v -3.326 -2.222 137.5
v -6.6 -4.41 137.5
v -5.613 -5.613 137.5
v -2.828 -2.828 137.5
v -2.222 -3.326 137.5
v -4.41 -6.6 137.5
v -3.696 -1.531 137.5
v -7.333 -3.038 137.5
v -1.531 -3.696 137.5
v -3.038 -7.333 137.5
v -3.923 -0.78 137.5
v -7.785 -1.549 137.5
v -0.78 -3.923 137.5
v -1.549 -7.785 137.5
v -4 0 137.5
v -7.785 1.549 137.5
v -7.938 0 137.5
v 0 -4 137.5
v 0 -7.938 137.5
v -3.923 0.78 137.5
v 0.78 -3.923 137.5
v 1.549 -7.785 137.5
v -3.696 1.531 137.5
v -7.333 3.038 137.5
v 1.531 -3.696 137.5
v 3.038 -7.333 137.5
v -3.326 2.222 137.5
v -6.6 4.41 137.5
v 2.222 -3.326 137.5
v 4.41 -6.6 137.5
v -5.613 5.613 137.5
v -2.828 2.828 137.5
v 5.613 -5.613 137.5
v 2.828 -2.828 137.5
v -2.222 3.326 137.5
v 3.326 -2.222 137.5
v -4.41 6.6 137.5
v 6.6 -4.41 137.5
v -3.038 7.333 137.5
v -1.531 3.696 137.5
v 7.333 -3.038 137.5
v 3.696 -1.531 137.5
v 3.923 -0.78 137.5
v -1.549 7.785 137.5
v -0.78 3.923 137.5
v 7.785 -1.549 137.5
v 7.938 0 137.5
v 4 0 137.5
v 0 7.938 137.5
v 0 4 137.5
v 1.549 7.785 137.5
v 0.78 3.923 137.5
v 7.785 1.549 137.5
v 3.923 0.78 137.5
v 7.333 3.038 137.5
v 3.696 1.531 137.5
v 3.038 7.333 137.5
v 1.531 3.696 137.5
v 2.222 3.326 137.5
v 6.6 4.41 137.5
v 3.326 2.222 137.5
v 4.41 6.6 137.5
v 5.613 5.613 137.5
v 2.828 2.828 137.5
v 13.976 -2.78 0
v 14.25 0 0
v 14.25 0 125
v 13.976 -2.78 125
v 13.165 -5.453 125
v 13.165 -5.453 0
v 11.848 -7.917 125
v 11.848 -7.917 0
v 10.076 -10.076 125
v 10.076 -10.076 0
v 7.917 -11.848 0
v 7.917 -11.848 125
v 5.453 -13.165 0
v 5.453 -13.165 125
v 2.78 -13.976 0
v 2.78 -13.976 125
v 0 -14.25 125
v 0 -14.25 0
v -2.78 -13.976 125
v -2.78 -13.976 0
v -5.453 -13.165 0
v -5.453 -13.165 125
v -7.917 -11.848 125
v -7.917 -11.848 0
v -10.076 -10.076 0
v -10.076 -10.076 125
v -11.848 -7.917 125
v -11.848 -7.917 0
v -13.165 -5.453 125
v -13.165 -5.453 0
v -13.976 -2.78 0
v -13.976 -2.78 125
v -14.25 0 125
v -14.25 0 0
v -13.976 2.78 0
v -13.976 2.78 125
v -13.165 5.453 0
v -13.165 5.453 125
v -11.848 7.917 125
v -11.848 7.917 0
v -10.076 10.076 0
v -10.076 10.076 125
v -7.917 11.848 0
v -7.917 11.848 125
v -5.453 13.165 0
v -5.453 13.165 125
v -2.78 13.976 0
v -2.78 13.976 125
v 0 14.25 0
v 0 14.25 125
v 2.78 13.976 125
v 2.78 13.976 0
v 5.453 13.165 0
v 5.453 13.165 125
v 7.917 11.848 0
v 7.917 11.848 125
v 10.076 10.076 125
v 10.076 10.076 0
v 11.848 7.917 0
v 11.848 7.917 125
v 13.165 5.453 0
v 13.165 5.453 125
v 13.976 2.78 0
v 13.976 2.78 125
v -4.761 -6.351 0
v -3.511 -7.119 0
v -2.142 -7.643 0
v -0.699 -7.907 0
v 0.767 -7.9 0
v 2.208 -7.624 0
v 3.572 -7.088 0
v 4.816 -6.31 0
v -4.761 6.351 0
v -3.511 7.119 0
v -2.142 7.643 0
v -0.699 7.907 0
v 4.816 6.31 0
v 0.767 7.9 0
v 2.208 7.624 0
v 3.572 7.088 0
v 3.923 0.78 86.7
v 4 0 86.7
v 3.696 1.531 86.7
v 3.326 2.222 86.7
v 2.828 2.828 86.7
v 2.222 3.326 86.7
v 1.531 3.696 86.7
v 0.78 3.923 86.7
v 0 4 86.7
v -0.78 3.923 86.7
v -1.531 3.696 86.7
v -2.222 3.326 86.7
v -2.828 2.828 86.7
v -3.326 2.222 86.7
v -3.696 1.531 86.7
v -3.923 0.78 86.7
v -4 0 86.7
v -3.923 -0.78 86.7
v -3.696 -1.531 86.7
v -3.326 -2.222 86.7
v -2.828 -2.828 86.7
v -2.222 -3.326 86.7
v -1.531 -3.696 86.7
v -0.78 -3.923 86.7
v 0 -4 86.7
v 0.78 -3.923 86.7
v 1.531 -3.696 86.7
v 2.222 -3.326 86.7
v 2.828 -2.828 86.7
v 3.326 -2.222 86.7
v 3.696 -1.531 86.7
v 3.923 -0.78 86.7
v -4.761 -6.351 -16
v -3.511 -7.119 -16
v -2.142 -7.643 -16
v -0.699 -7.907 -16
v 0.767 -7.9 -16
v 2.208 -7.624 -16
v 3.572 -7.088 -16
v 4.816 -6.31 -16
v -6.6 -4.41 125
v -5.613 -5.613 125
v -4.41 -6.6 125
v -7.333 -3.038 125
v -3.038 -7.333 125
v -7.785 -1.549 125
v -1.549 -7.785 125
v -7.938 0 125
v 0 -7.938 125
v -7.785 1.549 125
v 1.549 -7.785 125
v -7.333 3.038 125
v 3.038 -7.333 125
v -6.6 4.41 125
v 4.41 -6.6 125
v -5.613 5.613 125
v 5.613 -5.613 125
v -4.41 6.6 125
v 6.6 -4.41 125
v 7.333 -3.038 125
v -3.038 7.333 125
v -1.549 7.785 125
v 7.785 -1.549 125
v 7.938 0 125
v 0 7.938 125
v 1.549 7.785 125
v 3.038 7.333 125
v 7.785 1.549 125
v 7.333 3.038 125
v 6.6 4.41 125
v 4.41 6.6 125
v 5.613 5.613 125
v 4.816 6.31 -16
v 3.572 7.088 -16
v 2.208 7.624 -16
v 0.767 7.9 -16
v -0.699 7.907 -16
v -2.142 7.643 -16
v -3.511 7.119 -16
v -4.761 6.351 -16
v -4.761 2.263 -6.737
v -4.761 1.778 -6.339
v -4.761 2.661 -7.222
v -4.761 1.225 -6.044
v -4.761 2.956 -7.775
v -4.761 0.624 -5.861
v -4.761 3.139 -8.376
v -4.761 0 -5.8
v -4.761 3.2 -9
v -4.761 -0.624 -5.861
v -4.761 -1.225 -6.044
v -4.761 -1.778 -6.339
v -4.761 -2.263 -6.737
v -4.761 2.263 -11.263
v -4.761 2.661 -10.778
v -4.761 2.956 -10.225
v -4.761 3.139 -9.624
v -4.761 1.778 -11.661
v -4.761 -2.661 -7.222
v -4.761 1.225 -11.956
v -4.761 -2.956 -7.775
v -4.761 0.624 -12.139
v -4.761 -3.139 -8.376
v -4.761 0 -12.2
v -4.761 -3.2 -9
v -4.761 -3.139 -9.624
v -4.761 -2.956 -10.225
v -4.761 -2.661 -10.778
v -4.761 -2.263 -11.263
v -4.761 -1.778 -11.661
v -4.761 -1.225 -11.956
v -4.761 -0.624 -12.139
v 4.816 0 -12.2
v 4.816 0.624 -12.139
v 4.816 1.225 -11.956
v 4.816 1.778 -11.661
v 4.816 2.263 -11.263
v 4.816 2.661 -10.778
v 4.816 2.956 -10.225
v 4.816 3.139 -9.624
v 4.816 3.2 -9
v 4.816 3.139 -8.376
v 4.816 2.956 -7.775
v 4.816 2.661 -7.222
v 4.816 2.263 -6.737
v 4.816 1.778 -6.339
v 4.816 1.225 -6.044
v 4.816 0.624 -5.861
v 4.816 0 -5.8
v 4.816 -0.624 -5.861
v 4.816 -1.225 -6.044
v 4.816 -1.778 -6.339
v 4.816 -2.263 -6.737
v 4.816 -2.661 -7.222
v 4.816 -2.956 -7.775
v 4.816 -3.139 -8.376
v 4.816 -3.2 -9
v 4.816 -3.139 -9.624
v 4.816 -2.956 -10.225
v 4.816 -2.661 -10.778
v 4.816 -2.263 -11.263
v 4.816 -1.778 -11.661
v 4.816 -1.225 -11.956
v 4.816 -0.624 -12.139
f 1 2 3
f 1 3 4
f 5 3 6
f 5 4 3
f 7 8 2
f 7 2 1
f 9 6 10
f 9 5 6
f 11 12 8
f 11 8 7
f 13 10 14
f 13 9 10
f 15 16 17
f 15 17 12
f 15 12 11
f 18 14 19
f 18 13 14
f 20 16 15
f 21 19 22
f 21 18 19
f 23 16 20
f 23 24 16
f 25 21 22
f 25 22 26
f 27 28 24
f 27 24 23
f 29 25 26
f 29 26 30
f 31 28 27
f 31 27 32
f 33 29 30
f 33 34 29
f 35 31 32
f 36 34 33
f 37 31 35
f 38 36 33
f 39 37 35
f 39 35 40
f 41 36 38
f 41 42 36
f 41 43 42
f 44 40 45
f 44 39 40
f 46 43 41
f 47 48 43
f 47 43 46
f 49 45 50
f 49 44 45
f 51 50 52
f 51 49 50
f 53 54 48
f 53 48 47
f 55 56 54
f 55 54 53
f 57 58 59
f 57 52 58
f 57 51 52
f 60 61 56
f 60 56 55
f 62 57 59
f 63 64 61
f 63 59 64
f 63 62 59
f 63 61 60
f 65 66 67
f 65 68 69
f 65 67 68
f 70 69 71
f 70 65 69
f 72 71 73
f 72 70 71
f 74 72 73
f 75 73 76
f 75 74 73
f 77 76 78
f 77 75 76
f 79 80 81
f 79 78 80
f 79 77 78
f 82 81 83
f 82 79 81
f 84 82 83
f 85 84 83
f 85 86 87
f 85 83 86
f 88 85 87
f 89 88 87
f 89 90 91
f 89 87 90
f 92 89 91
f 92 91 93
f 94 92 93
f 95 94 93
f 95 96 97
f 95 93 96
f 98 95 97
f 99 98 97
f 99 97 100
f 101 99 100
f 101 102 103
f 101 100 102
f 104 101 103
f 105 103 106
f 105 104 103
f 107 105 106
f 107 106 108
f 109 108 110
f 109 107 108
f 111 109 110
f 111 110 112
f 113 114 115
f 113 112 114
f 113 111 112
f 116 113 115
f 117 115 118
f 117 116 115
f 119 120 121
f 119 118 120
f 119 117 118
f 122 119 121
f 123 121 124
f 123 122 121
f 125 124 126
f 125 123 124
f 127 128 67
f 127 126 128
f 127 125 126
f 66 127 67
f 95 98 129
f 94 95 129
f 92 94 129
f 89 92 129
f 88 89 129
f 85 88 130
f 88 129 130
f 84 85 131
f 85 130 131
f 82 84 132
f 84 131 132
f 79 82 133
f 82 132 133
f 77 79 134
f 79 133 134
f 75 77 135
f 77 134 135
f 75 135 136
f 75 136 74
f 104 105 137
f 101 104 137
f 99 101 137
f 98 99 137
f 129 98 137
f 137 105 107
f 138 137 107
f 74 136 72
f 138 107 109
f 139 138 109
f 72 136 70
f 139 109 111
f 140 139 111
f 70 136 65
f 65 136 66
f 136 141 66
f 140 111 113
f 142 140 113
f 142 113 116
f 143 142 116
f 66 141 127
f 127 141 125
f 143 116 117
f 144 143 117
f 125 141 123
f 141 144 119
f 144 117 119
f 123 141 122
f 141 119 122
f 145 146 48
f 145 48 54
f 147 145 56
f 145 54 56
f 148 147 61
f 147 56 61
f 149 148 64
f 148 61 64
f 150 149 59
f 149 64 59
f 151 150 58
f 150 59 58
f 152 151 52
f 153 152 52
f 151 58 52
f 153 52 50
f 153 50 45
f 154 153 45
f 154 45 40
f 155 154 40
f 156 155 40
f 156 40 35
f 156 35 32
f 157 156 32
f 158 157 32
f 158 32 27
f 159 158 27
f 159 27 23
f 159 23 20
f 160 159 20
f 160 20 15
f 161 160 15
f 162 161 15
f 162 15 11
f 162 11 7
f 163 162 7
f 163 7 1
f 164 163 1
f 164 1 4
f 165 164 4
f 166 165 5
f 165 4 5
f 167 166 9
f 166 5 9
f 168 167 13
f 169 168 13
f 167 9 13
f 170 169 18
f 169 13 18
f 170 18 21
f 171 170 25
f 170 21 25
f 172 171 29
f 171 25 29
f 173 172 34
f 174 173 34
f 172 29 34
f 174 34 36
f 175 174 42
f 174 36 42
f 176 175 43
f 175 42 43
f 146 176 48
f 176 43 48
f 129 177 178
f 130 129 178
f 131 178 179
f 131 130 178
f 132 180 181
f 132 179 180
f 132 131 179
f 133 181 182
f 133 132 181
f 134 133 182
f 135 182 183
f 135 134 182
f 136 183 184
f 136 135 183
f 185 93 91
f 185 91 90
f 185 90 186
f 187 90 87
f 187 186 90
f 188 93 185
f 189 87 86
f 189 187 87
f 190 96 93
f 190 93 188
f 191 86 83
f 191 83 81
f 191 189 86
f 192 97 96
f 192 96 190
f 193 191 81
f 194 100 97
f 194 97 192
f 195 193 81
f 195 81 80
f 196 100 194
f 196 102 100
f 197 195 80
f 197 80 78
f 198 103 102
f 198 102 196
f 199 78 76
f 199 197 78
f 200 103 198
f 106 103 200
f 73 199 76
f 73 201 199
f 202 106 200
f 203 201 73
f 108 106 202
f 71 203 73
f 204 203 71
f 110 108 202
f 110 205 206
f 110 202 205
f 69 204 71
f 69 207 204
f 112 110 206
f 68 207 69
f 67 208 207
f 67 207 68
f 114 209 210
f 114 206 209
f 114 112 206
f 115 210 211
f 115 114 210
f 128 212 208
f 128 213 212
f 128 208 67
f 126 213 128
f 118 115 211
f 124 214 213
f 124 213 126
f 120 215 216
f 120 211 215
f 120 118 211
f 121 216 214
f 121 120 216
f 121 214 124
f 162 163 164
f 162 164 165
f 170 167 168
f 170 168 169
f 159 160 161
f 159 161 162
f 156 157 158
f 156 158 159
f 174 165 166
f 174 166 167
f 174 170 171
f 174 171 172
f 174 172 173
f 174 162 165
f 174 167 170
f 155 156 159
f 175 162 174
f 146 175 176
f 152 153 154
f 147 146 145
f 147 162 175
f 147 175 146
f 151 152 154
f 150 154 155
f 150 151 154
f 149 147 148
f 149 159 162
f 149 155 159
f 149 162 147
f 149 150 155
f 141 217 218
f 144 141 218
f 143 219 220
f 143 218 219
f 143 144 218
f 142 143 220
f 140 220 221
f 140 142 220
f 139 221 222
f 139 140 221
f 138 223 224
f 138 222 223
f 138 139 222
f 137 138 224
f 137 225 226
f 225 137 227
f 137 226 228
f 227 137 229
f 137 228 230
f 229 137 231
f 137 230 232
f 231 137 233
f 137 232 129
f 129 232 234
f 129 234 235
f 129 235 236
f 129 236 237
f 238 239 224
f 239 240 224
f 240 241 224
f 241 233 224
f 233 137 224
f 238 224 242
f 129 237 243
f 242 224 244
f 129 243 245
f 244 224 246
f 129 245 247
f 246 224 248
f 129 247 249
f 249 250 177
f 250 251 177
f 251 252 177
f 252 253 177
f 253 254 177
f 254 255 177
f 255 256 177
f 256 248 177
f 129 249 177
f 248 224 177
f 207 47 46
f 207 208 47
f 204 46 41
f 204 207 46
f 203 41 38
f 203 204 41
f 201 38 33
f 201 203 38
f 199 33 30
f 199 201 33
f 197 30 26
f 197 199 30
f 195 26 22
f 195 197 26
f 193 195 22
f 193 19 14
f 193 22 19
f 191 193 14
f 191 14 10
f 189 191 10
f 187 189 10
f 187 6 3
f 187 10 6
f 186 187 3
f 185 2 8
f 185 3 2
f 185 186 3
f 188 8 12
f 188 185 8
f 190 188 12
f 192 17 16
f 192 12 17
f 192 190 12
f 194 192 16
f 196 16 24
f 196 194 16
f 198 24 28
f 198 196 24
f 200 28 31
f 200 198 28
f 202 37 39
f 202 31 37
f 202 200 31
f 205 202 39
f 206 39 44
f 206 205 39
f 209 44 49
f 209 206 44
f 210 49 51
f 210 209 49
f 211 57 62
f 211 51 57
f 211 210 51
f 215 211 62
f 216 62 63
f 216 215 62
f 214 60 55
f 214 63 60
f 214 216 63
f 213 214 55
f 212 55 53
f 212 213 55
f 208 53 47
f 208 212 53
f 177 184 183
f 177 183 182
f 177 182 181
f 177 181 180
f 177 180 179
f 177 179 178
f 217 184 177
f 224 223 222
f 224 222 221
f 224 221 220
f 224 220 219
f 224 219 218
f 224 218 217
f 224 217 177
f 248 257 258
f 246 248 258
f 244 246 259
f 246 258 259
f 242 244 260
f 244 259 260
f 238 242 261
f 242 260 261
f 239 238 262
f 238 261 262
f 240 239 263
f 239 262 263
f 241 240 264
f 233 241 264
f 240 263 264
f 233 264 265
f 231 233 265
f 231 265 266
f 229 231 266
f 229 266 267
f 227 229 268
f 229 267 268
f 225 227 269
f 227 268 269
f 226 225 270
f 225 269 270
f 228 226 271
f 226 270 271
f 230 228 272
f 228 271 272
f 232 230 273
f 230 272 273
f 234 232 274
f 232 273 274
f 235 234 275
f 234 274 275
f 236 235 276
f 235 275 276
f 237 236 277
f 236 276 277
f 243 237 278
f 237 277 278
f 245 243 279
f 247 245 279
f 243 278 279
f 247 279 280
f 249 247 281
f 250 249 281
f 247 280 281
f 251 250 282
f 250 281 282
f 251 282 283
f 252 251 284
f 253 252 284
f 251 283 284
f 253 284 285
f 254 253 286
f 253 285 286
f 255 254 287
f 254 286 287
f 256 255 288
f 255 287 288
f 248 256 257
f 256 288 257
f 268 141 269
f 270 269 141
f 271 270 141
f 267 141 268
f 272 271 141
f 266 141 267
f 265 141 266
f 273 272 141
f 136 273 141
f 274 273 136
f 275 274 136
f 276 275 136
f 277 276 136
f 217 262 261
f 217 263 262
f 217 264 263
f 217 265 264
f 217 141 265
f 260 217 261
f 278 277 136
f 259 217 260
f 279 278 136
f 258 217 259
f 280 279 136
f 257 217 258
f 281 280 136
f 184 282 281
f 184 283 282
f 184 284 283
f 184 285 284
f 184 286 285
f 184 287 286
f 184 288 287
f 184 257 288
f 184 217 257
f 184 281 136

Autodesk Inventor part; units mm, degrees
ref_plane "YZ Plane" through (0, 0, 0) normal (1, 0, 0) x (0, 1, 0)
ref_plane "XZ Plane" through (0, 0, 0) normal (0, 1, 0) x (-1, 0, 0)
ref_plane "XY Plane" through (0, 0, 0) normal (0, 0, 1) x (1, 0, 0)
sketch "Sketch1" plane through (0, 0, 0) normal (0, 0, 1) x (1, 0, 0)
  circle A0 centre (0, 0) radius 14.25
  dimension "d0" = 28.5
extrude "Extrusion1" add sketch "Sketch1" along normal blind 125
sketch "Sketch2" plane through (0, 0, 125) normal (0, 0, 1) x (1, 0, 0)
  circle A0 centre (0, 0) radius 7.9375
  dimension "d3" = 15.875
extrude "Extrusion2" add sketch "Sketch2" along normal blind 12.5
sketch "Sketch3" plane through (0, 0, 137.5) normal (0, 0, 1) x (1, 0, 0)
  circle A0 centre (0, 0) radius 4
  dimension "d6" = 8
extrude "Extrusion3" cut sketch "Sketch3" against normal blind 50.8
sketch "Sketch4" plane through (0, 0, 0) normal (0, 0, -1) x (-1, 0, 0)
  circle A0 centre (0, 0) radius 7.9375
  dimension "d9" = 15.875
extrude "Extrusion4" add sketch "Sketch4" along normal blind 16
sketch "Sketch5" plane through (0, 0, -16) normal (0, 0, -1) x (-1, 0, 0)
  line L0 (-4.75, -7.9375) -> (4.75, -7.9375)
  line L1 (4.75, -7.9375) -> (4.75, 7.9375)
  line L2 (4.75, 7.9375) -> (-4.75, 7.9375)
  line L3 (-4.75, 7.9375) -> (-4.75, -7.9375)
  line L4 (-4.75, -7.9375) -> (4.75, 7.9375) construction
  line L5 (4.75, -7.9375) -> (-4.75, 7.9375) construction
  circle A0 centre (0, 0) radius 7.9375 construction
  circle A1 centre (0, 0) radius 7.9375 projected
  arc A2 (-4.8155, 6.3099) -> (-4.8155, -6.3099) centre (0, 0) ccw
  arc A3 (4.7611, -6.351) -> (4.7611, 6.351) centre (0, 0) ccw
  line L6 (-4.8155, 6.3099) -> (-4.8155, -6.3099)
  line L7 (4.7611, 6.351) -> (4.7611, -6.351)
  dimension "d12" = 9.5
extrude "Extrusion5" cut sketch "Sketch5" against normal up to surface (16 mm away) contours A1 L6 | L7 A1
sketch "Sketch6" plane through (4.8155, -6.3099, -16) normal (1, 0, 0) x (0, 0, -1)
  line L0 (0, -0.0411) -> (0, 12.6609) construction
  line L1 (0, 6.3099) -> (-7, 6.3099) construction
  circle A0 centre (-7, 6.3099) radius 3.2
  point P0 (-16, 6.3099)
  dimension "d15" = 6.4
  dimension "d16" = 7
extrude "Extrusion6" cut sketch "Sketch6" against normal through all
properties part number "cylinder"
